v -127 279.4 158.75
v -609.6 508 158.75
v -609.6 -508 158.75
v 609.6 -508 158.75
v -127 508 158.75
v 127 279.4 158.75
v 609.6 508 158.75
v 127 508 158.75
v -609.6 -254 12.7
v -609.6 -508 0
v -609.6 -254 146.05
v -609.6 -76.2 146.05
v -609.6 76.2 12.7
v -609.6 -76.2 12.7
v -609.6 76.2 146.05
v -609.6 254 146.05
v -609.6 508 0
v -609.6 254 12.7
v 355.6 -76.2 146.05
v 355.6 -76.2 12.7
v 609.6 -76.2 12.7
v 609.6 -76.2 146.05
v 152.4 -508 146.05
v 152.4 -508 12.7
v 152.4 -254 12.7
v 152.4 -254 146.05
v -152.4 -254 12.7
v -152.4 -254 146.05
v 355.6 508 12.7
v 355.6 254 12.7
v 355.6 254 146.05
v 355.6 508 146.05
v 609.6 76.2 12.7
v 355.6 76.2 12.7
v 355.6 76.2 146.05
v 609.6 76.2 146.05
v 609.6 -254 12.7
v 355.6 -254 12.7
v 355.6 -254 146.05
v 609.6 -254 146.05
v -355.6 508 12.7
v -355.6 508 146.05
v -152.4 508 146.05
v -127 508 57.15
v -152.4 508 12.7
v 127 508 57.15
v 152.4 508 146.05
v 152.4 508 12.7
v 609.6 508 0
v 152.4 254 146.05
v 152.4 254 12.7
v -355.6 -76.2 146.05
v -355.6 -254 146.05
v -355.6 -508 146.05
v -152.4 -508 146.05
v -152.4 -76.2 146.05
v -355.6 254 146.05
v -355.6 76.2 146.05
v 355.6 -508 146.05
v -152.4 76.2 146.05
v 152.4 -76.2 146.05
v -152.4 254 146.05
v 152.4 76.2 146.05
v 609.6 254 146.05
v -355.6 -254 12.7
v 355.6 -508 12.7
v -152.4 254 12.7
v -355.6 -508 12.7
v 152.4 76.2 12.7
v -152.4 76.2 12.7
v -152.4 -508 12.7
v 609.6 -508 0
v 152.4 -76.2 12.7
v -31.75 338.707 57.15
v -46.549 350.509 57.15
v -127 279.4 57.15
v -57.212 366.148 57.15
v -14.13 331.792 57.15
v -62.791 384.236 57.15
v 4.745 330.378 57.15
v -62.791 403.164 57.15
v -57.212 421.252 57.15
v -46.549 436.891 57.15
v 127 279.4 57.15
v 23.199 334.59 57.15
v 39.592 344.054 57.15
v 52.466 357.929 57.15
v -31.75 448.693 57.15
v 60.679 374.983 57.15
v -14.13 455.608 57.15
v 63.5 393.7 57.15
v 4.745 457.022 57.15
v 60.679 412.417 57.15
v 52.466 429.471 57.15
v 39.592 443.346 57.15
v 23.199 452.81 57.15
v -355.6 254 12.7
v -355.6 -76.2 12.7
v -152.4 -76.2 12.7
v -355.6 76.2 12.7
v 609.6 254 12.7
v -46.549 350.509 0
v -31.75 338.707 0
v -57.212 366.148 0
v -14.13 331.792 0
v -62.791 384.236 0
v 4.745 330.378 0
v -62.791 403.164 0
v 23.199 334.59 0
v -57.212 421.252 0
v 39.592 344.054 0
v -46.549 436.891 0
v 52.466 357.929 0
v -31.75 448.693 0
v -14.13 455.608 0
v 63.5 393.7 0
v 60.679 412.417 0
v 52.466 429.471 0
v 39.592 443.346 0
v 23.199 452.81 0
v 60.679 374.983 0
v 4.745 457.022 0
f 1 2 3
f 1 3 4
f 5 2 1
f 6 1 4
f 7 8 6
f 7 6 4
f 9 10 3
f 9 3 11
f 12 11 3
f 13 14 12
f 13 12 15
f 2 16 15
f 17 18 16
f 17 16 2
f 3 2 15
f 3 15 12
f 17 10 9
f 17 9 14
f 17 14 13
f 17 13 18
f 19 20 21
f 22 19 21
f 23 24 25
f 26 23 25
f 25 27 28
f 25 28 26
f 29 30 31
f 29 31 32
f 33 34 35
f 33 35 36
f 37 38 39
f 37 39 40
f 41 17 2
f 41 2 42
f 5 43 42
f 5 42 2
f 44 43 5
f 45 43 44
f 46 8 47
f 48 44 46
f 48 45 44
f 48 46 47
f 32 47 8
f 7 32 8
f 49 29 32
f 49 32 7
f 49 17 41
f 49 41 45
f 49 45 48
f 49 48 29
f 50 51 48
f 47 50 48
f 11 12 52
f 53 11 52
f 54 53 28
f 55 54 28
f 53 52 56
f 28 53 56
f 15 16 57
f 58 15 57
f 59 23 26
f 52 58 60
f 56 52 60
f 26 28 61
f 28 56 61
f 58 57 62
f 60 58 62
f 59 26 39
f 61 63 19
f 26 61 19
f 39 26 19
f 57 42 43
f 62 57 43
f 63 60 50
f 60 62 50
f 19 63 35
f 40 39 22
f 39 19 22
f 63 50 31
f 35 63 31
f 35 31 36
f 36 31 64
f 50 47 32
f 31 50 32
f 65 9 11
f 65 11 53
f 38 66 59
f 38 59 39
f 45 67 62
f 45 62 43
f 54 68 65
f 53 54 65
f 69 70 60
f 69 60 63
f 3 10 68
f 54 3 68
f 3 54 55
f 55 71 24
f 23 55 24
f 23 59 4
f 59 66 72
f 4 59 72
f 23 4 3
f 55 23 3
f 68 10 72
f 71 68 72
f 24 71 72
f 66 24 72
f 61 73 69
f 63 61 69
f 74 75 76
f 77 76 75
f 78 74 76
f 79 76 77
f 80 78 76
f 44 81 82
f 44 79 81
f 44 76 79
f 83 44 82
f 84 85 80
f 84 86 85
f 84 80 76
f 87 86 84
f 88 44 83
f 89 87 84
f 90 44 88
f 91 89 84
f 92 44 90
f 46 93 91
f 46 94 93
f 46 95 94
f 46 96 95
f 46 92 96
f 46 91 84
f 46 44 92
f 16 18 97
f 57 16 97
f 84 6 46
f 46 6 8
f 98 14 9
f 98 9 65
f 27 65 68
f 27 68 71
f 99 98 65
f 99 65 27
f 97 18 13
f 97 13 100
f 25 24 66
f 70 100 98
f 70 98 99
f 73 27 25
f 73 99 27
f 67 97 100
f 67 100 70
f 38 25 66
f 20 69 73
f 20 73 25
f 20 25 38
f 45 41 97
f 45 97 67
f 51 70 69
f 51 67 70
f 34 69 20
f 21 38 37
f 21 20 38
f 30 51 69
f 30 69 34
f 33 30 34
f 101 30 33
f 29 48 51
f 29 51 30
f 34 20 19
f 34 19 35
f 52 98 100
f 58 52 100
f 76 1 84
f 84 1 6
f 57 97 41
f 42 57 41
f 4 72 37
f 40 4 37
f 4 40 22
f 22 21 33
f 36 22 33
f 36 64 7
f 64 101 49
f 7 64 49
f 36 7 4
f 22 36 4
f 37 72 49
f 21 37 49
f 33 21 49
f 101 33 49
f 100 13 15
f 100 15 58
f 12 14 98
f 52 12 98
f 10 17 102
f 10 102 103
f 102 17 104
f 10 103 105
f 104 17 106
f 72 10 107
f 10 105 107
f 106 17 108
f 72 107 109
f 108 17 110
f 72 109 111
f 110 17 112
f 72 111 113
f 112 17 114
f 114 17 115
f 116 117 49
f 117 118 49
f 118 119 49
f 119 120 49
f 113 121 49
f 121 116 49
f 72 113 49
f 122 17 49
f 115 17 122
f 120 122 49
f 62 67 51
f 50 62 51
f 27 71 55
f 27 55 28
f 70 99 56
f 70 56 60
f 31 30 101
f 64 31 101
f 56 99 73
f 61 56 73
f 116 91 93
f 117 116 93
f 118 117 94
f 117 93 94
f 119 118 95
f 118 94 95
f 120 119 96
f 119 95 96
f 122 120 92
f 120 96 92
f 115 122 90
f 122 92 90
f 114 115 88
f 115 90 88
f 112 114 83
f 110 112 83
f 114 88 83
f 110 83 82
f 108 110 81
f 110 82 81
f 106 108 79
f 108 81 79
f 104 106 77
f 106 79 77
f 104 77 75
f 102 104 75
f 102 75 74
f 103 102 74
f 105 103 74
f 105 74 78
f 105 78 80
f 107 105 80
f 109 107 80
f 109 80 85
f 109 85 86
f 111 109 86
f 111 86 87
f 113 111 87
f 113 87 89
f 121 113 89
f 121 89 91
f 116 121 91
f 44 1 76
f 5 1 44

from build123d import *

# Parameters (mm, degrees)
F0_W     = 1219.2
F0_H     = 1016
F1_DEPTH = 12.7
F2_W     = 254
F2_H     = 254
F2_W_2   = 304.8
F2_H_2   = 152.4
F3_DEPTH = 133.35
F4_W     = 1219.2
F4_H     = 1016
F5_DEPTH = 12.7
F6_W     = 254
F6_H     = 228.6
F7_DEPTH = 101.6
F8_R     = 63.5
F9_DEPTH = 57.151


with BuildPart() as f1:
    # F0 (on Top) → F1 (new body)
    with BuildSketch(Plane.XY):
        Rectangle(F0_W, F0_H)
    extrude(amount=F1_DEPTH)

    # F2 (on face) → F3 (join)
    with BuildSketch(Plane.XY.offset(12.7)):
        with Locations((-482.6, 381)):
            Rectangle(F2_W, F2_H)
        with Locations((482.6, 381)):
            Rectangle(F2_W, F2_H)
        with Locations((482.6, -381)):
            Rectangle(F2_W, F2_H)
        with Locations((-482.6, -381)):
            Rectangle(F2_W, F2_H)
        with Locations((0, 381)):
            Rectangle(F2_W_2, F2_H)
        with Locations((0, -381)):
            Rectangle(F2_W_2, F2_H)
        with Locations((482.6, 0)):
            Rectangle(F2_W, F2_H_2)
        with Locations((-482.6, 0)):
            Rectangle(F2_W, F2_H_2)
        Rectangle(F2_W_2, F2_H_2)
    extrude(amount=F3_DEPTH)

    # F4 (on face) → F5 (join)
    with BuildSketch(Plane.XY.offset(146.05)):
        Rectangle(F4_W, F4_H)
    extrude(amount=F5_DEPTH)

    # F6 (on face) → F7 (cut)
    with BuildSketch(Plane.XY.offset(158.75)):
        with Locations((0, 393.7)):
            Rectangle(F6_W, F6_H)
    extrude(amount=-F7_DEPTH, mode=Mode.SUBTRACT)

    # F8 (on face) → F9 (cut, through all)
    with BuildSketch(Plane.XY.offset(57.15)):
        with Locations((0, 393.7)):
            Circle(F8_R)
    extrude(amount=-F9_DEPTH, mode=Mode.SUBTRACT)


solid = f1.part
